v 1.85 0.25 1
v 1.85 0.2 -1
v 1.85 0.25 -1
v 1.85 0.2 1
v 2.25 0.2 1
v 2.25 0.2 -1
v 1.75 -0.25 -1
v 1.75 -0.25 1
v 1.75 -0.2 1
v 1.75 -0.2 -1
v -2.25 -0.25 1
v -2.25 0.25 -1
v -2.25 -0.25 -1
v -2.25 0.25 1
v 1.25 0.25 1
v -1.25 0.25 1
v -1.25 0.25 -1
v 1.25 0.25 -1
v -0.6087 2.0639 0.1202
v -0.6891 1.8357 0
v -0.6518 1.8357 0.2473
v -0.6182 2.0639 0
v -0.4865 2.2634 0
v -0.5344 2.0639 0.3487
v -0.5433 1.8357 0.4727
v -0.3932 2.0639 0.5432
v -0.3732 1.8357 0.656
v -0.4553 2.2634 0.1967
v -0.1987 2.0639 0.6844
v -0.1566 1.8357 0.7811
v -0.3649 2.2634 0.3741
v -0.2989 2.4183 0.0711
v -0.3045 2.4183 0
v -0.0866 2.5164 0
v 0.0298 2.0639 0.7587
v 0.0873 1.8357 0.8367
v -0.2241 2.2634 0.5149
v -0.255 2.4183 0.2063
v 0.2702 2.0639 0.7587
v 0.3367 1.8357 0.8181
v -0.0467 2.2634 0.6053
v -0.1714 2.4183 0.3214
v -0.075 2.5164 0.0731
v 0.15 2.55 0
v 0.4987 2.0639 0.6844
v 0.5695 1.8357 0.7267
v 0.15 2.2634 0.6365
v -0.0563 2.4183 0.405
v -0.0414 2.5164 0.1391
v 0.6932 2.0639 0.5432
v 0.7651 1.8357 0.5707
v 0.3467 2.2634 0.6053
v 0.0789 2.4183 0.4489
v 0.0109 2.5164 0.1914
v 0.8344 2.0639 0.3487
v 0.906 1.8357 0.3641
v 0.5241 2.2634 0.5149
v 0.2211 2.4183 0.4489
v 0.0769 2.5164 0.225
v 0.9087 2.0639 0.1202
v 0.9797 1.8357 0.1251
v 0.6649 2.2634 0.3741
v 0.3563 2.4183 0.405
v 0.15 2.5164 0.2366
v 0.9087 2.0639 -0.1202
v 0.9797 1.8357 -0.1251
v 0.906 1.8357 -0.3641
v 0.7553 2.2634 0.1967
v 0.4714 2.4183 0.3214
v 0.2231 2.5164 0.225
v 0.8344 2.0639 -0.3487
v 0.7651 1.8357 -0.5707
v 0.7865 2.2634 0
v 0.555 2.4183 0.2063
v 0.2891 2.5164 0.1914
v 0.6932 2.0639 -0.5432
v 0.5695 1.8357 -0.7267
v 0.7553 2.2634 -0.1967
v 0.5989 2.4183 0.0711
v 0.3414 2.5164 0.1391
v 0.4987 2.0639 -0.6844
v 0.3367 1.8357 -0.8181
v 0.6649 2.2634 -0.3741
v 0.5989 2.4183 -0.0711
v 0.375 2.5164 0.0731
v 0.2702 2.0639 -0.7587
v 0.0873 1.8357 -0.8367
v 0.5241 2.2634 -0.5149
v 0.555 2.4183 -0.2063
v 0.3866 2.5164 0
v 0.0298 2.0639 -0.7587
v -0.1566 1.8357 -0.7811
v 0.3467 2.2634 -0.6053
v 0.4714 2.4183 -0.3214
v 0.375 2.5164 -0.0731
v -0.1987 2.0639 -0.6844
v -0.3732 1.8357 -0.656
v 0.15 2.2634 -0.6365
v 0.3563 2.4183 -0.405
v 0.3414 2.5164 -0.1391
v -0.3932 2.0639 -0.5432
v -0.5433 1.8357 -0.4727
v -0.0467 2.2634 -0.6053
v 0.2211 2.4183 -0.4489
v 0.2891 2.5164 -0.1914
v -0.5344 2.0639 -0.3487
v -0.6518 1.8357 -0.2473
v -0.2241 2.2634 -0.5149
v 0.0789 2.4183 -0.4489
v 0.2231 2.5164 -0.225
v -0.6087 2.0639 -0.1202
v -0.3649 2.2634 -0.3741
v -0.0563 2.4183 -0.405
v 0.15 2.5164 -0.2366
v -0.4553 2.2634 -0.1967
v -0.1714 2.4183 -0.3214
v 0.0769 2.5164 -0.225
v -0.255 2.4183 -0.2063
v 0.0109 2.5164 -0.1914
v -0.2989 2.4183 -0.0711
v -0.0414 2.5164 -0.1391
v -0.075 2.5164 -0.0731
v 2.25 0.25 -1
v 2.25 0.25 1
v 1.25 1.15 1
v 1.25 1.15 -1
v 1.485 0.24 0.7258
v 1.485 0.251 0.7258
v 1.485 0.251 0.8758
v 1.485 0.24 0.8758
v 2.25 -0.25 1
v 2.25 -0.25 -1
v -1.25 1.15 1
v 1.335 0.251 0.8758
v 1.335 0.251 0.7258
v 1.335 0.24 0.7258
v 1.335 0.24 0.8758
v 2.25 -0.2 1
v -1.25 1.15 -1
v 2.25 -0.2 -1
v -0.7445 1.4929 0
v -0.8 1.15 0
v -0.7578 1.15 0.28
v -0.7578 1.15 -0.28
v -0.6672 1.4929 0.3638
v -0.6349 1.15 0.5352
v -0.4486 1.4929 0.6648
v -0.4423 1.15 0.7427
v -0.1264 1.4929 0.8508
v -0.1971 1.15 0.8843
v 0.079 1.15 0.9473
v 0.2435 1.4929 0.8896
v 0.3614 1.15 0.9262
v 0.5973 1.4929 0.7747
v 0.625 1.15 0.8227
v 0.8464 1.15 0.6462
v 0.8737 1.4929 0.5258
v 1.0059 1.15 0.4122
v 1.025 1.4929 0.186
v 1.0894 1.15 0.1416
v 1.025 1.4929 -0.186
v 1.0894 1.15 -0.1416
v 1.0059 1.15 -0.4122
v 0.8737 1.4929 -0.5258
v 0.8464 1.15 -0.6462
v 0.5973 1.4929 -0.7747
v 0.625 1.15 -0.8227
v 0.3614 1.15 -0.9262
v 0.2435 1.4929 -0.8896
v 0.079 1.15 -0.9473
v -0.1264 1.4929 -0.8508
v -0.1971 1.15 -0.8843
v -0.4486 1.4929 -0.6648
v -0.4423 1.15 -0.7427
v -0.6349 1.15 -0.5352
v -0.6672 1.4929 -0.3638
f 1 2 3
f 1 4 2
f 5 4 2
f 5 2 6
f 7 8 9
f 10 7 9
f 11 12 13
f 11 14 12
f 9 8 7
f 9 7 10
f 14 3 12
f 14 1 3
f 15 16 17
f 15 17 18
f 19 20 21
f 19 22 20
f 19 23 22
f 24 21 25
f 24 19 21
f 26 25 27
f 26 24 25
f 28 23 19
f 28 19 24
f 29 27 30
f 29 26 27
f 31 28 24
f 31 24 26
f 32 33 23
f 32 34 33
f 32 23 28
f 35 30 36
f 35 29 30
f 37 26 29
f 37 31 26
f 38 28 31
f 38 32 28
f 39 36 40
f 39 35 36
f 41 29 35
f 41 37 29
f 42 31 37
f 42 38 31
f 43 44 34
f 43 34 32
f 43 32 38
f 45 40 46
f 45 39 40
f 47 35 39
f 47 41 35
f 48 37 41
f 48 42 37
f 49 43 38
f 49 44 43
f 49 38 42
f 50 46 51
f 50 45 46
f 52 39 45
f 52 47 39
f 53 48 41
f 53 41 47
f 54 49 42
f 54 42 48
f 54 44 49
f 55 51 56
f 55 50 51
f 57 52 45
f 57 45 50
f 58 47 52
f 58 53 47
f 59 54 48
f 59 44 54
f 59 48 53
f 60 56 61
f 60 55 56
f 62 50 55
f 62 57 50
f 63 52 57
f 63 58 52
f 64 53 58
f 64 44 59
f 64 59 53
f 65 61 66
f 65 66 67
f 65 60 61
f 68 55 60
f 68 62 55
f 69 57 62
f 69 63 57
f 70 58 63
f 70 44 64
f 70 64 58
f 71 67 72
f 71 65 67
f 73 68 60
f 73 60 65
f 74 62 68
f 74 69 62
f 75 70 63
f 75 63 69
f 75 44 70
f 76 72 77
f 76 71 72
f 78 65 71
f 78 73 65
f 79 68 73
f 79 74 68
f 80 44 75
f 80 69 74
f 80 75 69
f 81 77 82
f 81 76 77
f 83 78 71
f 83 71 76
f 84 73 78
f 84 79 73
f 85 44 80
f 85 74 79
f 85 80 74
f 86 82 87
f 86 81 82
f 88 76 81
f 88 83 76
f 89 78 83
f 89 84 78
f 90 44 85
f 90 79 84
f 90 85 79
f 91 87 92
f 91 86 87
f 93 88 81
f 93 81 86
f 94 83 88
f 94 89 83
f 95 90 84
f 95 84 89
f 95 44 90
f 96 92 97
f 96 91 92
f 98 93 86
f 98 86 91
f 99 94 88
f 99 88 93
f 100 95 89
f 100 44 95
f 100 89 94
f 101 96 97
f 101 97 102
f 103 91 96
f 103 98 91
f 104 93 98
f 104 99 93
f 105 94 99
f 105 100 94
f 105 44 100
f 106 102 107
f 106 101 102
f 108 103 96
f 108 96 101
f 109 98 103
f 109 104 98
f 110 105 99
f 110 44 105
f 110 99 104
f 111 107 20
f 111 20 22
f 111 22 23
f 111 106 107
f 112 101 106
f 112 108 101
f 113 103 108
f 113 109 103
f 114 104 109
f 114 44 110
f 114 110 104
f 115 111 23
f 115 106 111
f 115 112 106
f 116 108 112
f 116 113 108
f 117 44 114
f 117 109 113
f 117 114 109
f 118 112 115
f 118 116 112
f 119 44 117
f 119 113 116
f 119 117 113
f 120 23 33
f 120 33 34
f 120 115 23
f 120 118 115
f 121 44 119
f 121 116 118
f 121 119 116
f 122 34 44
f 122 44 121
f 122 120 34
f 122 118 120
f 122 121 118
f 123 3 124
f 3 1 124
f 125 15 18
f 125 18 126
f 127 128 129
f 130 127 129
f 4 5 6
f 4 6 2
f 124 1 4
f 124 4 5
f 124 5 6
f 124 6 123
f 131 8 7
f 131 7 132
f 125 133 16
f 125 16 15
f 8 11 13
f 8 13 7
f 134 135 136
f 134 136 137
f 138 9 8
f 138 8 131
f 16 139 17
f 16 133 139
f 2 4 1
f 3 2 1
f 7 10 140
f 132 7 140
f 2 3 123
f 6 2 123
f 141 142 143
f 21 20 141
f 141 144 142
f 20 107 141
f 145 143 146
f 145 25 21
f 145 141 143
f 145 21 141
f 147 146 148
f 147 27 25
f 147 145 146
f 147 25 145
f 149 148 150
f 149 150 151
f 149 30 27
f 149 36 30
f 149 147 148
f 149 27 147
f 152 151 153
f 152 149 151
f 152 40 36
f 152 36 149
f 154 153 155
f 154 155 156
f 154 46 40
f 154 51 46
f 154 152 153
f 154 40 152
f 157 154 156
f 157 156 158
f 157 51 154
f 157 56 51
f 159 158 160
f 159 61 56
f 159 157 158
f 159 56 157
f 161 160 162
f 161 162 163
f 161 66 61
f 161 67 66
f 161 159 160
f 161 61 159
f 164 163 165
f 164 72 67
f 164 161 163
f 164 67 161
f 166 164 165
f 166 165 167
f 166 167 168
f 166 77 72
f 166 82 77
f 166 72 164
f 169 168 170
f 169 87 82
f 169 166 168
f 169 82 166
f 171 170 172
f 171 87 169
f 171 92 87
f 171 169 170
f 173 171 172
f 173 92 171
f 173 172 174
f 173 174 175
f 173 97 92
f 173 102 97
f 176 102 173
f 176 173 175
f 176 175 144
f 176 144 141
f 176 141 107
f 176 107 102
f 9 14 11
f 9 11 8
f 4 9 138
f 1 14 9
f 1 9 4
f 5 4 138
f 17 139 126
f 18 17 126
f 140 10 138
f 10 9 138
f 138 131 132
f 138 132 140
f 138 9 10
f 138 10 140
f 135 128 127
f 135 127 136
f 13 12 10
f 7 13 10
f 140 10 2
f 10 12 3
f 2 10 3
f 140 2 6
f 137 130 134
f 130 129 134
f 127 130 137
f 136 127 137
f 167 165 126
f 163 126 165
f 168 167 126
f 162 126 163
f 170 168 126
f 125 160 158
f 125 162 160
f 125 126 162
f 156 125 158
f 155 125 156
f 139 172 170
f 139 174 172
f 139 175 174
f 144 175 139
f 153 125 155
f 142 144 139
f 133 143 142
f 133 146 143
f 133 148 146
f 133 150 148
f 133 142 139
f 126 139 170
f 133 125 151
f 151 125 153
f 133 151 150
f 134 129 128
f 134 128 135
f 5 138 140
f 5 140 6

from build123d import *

# Parameters (mm, degrees)
EXTRUDE1_DEPTH      = 1
EXTRUDE2_DEPTH      = 1
SKETCH1_5_W         = 0.4
SKETCH1_5_H         = 0.05
EXTRUDE3_DEPTH      = 1
SKETCH1_5_W_2       = 0.5
EXTRUDE3_2_DEPTH    = 1
SKETCH2_W           = 0.15
SKETCH2_H           = 0.15
EXTRUDE4_DEPTH      = 0.001
EXTRUDE4_DEPTH_BACK = 0.01


with BuildPart() as part:
    # Sketch1 → Extrude1 (new body, symmetric)
    with BuildSketch(Plane.XY):
        Polygon((-1.25, 0.25), (-2.25, 0.25), (-2.25, -0.25), (1.75, -0.25), (1.75, -0.2), (2.25, -0.2), (2.25, 0.2), (1.85, 0.2), (1.85, 0.25), (1.25, 0.25), align=None)
    extrude(amount=EXTRUDE1_DEPTH, both=True)


with BuildPart() as body_2:
    # Sketch1_3 → Extrude2 (new body, symmetric)
    with BuildSketch(Plane.XY):
        Polygon((-1.25, 1.15), (-1.25, 0.25), (1.25, 0.25), (1.25, 1.15), (1.1, 1.15), (0.15, 1.15), align=None)
    extrude(amount=EXTRUDE2_DEPTH, both=True)

    # Sketch1_4 → Revolve1 (revolve)
    with BuildSketch(Plane.XY, mode=Mode.PRIVATE) as revolve1_sk:
        with BuildLine():
            Line((0.15, 2.55), (0.15, 1.15))
            Line((0.15, 1.15), (1.1, 1.15))
            Line((1.1, 1.15), (0.989096165, 1.835711557))
            ThreePointArc((0.989096165, 1.835711557), (0.700974217, 2.347246021), (0.15, 2.55))
        make_face()
    revolve(revolve1_sk.sketch.rotate(Axis((0.15, 1.15, 0), (0, 1, 0)), 180), axis=Axis((0.15, 1.15, 0), (0, 1, 0)))  # turned: the seam where the file's is


with BuildPart() as body_3:
    # Sketch1_5 → Extrude3 (new body, symmetric)
    with BuildSketch(Plane.XY):
        with Locations((2.05, 0.225)):
            Rectangle(SKETCH1_5_W, SKETCH1_5_H)
    extrude(amount=EXTRUDE3_DEPTH, both=True)


with BuildPart() as body_4:
    # Sketch1_5 → Extrude3 2 (new body, symmetric)
    with BuildSketch(Plane.XY):
        with Locations((2, -0.225)):
            Rectangle(SKETCH1_5_W_2, SKETCH1_5_H)
    extrude(amount=EXTRUDE3_2_DEPTH, both=True)


with BuildPart() as body_5:
    # Sketch2 → Extrude4 (new body, two sides)
    with BuildSketch(Plane(origin=(0, 0.25, 0), x_dir=(-1, 0, 0), z_dir=(0, 1, 0))) as extrude4_sk:
        with Locations((-1.410003, 0.800846333)):
            Rectangle(SKETCH2_W, SKETCH2_H)
    extrude(amount=EXTRUDE4_DEPTH)
    extrude(extrude4_sk.sketch, amount=-EXTRUDE4_DEPTH_BACK)


solid = Compound([part.part, body_2.part, body_3.part, body_4.part, body_5.part])
